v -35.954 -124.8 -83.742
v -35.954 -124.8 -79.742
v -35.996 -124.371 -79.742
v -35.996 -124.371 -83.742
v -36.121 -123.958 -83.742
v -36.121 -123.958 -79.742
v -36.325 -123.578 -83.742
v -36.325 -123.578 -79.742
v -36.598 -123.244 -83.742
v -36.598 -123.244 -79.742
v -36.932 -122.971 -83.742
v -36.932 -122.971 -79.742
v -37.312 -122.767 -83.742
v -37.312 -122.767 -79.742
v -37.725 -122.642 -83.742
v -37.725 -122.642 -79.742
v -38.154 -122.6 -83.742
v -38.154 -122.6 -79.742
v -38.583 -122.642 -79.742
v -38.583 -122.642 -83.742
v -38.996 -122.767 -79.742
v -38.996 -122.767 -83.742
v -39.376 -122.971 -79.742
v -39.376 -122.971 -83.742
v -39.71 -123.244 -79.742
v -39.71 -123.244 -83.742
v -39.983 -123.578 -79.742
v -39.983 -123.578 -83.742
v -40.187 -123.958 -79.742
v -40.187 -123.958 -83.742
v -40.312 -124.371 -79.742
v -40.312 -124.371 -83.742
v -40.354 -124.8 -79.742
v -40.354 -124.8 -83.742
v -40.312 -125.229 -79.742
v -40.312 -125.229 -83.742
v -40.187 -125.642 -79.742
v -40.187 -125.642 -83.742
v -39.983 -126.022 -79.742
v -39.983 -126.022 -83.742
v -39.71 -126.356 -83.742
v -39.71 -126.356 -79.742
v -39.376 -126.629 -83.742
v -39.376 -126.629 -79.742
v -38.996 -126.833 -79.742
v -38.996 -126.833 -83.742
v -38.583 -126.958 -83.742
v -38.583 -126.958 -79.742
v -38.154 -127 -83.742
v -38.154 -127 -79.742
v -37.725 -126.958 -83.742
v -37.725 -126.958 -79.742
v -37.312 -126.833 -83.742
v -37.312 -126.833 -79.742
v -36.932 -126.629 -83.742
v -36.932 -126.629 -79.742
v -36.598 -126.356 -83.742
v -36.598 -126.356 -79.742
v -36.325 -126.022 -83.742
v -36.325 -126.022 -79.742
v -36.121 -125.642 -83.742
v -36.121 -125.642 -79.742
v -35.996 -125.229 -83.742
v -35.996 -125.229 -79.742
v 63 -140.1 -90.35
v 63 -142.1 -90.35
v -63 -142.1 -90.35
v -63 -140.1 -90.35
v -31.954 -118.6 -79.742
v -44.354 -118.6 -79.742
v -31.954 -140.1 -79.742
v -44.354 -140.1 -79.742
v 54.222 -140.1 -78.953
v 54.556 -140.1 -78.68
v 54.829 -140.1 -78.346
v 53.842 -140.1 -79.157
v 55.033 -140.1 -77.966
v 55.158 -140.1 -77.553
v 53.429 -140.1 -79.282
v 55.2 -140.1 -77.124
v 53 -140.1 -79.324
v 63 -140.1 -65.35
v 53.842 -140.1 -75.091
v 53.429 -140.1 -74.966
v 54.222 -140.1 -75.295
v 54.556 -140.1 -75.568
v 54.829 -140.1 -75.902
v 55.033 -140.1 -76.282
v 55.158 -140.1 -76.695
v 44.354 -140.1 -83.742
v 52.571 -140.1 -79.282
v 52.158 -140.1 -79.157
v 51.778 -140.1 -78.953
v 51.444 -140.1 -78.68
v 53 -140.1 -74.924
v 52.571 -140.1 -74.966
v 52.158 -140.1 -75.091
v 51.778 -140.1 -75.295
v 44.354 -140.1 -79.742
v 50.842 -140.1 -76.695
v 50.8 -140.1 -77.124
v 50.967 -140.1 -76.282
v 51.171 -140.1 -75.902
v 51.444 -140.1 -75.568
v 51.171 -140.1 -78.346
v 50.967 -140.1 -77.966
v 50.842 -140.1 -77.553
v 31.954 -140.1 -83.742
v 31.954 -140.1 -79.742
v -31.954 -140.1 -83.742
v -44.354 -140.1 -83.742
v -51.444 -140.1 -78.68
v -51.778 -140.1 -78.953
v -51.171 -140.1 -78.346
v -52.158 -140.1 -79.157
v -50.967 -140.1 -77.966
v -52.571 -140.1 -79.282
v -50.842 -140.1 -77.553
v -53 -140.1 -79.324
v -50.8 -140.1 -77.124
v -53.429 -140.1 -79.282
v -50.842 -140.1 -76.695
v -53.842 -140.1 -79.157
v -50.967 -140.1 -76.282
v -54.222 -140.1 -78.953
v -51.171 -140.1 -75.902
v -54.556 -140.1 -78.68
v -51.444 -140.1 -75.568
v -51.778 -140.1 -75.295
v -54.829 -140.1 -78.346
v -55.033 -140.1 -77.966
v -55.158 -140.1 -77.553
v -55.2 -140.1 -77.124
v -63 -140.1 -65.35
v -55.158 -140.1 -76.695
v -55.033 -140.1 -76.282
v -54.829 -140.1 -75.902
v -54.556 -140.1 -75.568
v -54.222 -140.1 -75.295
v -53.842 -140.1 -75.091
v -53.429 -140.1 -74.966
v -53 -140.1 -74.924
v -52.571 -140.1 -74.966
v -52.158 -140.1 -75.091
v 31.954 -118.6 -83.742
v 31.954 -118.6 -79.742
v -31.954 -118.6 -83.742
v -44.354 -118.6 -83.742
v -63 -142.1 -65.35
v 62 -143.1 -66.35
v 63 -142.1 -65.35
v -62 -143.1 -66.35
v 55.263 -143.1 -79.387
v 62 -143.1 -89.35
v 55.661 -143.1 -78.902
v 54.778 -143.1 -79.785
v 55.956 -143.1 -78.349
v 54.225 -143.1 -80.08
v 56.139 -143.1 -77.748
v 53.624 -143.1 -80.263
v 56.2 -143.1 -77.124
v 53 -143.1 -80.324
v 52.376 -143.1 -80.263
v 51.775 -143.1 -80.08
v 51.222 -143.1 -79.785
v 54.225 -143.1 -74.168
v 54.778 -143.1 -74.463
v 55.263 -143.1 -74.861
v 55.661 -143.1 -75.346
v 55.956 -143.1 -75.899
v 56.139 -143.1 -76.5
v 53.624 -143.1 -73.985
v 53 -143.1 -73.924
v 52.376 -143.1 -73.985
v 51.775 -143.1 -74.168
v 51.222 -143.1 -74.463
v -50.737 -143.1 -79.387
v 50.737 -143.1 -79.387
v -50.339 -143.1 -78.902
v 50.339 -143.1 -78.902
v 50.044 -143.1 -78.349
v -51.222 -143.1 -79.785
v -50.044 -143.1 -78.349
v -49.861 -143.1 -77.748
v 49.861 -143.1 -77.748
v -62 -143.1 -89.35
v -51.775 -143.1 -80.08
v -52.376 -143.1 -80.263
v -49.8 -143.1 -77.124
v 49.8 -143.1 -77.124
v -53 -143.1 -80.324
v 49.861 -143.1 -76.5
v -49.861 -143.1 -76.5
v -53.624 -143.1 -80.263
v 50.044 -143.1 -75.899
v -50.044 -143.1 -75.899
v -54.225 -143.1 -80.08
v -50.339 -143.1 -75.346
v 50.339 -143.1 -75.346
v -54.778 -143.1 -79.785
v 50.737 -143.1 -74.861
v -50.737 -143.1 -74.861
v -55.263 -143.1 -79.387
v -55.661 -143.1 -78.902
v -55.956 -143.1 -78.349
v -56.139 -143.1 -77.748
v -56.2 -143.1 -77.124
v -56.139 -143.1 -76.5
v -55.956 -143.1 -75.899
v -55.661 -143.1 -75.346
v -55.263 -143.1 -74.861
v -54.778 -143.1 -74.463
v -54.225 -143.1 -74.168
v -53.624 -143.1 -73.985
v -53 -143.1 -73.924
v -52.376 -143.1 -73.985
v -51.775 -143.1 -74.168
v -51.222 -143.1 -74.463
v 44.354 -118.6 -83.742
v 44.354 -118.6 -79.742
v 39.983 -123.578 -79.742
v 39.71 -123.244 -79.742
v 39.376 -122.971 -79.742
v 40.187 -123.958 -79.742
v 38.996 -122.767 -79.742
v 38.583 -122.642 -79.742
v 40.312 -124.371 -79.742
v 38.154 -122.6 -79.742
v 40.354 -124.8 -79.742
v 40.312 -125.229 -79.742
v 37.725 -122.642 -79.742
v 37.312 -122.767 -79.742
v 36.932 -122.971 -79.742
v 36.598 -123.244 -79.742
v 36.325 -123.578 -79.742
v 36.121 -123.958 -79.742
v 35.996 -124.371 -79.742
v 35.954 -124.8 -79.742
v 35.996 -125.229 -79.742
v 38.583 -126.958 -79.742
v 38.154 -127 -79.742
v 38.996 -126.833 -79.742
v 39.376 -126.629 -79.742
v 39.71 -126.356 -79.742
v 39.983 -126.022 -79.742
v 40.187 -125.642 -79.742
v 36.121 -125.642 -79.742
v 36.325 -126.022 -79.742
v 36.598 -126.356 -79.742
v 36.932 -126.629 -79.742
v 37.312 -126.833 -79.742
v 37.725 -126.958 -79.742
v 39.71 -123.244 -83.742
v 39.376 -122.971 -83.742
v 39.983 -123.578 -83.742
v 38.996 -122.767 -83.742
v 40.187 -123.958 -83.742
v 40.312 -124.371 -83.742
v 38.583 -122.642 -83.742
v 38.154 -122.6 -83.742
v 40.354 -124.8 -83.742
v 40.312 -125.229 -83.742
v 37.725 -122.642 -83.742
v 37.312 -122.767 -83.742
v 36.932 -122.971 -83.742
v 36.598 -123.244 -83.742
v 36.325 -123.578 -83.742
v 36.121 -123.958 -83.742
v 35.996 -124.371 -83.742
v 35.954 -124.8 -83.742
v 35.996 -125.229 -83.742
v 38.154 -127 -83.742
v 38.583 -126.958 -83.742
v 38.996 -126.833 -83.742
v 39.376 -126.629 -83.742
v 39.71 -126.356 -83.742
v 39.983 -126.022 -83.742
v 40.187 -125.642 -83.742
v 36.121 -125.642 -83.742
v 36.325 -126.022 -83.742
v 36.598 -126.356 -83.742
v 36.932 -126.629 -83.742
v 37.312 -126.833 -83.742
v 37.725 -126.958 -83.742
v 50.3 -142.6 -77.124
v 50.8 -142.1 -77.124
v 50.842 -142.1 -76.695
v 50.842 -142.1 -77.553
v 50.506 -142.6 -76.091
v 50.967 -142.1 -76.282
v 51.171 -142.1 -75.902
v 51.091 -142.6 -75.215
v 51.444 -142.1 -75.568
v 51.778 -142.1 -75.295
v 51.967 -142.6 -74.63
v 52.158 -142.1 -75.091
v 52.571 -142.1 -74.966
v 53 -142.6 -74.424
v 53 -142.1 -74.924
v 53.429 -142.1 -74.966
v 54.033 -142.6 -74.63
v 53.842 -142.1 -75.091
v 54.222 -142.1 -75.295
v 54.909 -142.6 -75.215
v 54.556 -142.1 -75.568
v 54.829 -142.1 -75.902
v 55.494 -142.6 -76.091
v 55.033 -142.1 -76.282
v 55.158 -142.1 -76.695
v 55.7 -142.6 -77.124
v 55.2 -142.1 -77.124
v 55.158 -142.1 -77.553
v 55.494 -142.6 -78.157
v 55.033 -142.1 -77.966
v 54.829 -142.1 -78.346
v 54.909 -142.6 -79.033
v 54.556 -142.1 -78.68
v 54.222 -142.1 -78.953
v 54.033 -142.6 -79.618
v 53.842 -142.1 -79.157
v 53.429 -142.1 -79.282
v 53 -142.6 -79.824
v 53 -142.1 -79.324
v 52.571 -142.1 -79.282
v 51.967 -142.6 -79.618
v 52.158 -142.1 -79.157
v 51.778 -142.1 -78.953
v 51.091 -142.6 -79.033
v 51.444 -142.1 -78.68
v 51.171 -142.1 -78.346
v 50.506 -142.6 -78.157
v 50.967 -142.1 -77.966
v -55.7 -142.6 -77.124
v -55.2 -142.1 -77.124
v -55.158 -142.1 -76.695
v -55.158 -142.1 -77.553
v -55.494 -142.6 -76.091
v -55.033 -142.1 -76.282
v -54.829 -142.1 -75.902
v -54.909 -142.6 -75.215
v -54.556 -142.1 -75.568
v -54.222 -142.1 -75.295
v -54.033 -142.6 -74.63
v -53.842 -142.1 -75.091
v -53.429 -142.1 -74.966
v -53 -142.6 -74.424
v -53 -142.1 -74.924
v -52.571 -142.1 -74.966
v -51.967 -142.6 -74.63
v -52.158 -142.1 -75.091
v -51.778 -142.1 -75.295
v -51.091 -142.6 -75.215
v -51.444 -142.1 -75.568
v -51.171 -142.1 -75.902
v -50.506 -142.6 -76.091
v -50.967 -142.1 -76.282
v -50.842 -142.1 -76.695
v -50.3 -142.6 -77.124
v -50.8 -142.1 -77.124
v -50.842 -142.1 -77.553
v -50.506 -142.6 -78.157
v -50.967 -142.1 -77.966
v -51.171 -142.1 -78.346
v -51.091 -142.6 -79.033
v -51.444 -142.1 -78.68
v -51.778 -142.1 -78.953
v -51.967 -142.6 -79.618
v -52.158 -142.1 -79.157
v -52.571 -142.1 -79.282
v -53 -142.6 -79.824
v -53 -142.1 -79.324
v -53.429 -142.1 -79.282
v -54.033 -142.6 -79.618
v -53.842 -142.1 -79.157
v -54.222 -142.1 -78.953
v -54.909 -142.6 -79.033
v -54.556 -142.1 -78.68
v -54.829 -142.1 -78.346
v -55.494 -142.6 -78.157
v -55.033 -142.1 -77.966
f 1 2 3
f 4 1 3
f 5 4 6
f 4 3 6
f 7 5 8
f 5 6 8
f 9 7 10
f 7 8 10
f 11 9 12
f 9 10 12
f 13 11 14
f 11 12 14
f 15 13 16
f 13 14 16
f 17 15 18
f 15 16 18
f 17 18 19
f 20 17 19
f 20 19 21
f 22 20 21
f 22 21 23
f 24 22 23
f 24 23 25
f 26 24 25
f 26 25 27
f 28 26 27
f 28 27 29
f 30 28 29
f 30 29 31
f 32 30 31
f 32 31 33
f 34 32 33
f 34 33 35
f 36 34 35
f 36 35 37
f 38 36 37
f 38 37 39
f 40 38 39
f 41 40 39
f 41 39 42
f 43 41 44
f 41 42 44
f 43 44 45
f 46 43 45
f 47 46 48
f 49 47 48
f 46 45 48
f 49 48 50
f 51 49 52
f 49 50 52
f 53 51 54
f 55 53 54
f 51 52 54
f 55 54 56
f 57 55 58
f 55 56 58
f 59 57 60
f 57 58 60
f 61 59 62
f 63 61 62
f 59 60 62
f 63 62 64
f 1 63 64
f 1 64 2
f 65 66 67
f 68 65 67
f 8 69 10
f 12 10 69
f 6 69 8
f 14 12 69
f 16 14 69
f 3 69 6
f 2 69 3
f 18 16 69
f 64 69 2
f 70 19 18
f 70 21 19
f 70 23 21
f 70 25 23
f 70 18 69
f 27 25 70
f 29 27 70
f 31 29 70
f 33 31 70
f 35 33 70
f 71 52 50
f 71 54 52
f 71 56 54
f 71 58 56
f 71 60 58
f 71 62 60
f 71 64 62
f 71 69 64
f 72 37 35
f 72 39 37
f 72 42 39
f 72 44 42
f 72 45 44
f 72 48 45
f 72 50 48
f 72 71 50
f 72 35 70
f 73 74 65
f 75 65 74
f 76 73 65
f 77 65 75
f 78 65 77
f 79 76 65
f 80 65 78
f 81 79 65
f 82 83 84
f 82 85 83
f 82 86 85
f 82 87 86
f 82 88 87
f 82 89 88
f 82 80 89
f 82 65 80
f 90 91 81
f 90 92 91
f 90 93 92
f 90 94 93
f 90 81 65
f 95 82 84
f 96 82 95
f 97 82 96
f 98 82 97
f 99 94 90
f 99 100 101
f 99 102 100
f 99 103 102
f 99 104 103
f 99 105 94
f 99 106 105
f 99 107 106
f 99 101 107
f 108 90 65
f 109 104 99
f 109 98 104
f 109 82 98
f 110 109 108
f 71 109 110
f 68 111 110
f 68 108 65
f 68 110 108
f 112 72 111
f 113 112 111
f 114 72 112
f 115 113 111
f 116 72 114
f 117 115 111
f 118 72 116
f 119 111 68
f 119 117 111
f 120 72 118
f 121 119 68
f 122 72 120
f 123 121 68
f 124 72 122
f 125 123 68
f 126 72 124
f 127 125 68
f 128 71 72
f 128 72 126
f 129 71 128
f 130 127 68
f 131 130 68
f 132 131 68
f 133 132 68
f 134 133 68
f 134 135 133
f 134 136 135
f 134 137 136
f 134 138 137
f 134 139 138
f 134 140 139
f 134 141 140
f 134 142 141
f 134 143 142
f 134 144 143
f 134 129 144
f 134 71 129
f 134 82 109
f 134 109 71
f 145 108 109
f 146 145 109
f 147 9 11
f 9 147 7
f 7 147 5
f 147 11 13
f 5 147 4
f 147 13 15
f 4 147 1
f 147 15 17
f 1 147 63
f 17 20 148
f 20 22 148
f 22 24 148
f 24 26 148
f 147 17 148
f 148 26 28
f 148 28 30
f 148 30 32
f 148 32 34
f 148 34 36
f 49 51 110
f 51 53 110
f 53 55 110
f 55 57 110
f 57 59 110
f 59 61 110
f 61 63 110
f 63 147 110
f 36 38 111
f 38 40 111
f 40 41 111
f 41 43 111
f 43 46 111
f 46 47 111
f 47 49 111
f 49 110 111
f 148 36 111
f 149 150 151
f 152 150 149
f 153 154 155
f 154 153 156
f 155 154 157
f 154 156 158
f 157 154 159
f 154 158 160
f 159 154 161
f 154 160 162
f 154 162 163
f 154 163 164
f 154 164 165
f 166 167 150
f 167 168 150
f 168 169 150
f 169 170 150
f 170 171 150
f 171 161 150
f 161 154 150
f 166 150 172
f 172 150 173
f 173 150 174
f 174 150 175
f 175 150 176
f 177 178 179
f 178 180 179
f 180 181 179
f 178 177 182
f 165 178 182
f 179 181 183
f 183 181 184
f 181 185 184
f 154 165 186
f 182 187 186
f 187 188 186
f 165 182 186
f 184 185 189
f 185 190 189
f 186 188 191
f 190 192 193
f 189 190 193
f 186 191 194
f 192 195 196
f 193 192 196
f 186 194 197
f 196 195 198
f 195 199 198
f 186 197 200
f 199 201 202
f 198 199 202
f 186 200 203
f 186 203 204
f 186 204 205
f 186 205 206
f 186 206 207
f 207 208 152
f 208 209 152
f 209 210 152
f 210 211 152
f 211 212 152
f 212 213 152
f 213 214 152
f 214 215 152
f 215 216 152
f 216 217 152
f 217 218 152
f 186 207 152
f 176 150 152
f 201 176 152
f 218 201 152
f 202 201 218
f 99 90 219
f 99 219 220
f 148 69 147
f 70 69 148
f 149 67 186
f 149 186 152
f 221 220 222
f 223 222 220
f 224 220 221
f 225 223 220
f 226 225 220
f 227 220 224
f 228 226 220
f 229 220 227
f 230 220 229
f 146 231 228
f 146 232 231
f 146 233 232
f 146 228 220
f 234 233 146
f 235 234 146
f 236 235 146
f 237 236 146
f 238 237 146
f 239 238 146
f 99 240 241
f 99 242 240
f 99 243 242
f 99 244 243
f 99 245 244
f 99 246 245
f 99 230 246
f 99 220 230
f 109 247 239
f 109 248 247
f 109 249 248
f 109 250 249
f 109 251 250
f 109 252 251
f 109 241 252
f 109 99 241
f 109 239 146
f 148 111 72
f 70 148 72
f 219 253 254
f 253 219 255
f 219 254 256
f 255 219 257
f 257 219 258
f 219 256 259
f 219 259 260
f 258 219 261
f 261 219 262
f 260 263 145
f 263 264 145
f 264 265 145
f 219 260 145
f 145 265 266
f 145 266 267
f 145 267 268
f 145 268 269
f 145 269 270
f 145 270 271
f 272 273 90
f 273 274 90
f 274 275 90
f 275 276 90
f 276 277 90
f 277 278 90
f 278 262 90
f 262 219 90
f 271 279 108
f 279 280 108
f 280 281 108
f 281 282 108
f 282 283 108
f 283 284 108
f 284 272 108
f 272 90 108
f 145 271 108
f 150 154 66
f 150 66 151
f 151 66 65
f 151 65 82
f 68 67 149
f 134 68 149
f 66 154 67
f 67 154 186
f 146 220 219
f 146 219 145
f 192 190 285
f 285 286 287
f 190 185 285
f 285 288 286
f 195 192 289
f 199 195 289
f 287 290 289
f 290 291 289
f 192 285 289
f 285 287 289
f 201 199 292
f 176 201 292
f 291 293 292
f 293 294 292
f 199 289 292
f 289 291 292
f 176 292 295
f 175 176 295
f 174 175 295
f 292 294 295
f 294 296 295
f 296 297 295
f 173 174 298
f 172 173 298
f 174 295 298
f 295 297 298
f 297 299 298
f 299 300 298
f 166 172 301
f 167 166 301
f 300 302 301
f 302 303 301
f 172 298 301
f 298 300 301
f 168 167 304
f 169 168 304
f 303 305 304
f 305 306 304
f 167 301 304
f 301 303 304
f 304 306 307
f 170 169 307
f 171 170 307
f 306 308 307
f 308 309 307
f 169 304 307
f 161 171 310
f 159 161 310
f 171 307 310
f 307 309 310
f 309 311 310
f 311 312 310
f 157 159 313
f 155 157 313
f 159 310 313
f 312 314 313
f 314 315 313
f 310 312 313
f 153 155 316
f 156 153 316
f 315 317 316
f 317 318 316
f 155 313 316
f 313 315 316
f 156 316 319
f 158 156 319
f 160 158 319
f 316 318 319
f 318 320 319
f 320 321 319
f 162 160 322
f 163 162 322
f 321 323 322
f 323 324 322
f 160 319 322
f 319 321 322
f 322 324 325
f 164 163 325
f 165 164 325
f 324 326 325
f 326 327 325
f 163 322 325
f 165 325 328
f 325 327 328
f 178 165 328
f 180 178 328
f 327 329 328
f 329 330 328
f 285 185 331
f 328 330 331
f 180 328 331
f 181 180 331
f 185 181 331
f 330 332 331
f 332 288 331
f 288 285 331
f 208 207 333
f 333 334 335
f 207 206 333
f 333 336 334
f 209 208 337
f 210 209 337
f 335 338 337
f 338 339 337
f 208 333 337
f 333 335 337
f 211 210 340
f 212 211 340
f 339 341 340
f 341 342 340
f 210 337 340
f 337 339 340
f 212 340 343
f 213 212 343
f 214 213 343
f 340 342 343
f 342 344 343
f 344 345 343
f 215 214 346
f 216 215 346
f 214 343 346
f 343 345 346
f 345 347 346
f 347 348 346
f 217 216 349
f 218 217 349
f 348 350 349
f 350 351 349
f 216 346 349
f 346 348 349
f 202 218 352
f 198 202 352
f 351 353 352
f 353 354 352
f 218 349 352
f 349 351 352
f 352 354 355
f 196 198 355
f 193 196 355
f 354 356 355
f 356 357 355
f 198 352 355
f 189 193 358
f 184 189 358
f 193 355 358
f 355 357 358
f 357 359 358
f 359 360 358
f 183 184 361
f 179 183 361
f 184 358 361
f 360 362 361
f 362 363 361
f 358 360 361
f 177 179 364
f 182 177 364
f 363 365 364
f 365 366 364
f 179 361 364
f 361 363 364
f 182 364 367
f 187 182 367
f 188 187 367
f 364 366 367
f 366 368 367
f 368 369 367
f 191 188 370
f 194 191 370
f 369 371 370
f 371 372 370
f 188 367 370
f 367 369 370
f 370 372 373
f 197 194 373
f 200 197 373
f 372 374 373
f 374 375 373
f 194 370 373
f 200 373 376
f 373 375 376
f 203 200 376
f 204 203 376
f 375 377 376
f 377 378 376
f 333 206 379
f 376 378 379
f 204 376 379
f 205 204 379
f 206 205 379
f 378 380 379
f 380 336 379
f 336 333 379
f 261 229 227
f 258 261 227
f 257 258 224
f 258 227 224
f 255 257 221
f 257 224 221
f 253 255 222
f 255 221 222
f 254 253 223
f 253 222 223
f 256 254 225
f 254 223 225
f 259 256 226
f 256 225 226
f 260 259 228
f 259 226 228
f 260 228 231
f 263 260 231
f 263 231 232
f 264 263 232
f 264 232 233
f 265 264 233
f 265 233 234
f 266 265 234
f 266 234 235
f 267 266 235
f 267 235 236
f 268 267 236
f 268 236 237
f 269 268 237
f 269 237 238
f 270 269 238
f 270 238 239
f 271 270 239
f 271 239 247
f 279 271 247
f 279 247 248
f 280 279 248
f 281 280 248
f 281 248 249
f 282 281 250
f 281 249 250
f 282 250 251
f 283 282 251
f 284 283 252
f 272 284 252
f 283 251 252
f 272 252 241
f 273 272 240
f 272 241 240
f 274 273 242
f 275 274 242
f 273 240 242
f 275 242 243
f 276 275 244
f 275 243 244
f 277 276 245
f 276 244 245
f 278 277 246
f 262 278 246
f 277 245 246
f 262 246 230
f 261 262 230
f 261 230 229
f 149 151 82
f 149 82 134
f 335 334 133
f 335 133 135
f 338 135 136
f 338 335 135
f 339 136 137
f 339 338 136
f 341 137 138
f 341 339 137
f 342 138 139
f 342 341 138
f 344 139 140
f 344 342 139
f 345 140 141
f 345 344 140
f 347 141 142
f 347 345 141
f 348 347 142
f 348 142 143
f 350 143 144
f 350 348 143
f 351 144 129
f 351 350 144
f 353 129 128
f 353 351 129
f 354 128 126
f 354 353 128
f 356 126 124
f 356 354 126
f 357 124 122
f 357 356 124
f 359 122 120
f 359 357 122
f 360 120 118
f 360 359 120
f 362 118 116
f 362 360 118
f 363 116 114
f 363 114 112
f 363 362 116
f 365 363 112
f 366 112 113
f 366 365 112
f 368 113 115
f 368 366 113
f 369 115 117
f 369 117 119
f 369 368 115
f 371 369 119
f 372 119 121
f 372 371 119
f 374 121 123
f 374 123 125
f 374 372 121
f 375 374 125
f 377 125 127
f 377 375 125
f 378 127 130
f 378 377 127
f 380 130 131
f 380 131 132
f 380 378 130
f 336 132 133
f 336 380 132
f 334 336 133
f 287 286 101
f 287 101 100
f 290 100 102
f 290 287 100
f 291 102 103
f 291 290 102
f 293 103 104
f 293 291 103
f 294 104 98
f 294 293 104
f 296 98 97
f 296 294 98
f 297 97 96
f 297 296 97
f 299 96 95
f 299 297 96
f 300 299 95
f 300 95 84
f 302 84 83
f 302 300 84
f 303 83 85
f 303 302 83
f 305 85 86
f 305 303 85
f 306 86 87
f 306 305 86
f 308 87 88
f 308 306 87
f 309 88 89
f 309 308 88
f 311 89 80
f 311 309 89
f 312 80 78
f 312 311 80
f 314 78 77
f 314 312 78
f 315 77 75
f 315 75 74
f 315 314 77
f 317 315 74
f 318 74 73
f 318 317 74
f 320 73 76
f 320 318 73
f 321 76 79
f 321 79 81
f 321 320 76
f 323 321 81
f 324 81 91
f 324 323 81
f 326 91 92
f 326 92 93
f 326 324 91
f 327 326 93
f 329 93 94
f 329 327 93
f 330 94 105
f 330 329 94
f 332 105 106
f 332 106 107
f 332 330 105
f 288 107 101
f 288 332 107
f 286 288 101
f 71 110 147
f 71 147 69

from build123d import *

# Parameters (mm, degrees)
SKETCH056_W             = 126
SKETCH056_H             = 25
SKETCH056_R             = 2.2
PAD024_DEPTH            = 3
SKETCH057_W             = 12.4
SKETCH057_H             = 4
PAD025_DEPTH            = 21.5
SKETCH058_R             = 2.2
POCKET031_DEPTH         = 10.609
CHAMFER023_SIZE         = 1
BODY012_ROLL_ANGLE      = 90
BODY012_PLACEMENT_ANGLE = 180


with BuildPart() as part:
    # Sketch056 → Pad024 (new body)
    with BuildSketch(Plane.XY):
        Rectangle(SKETCH056_W, SKETCH056_H)
        with Locations((-53, 0.726)):
            Circle(SKETCH056_R, mode=Mode.SUBTRACT)
        with Locations((53, 0.726)):
            Circle(SKETCH056_R, mode=Mode.SUBTRACT)
    extrude(amount=PAD024_DEPTH)

    # Sketch057 (on Face8 of Pad024) → Pad025 (join)
    with BuildSketch(Plane.XY.offset(3)):
        with Locations((-38.154, -3.892)):
            Rectangle(SKETCH057_W, SKETCH057_H)
        with Locations((38.154, -3.892)):
            Rectangle(SKETCH057_W, SKETCH057_H)
    extrude(amount=PAD025_DEPTH)

    # Sketch058 (on Face12 of Pad025) → Pocket031 (cut, through all)
    with BuildSketch(Plane(origin=(0, -1.892, 0), x_dir=(-1, 0, 0), z_dir=(0, 1, 0))):
        with Locations((-38.154, 18.3)):
            Circle(SKETCH058_R)
        with Locations((38.154, 18.3)):
            Circle(SKETCH058_R)
    extrude(amount=-POCKET031_DEPTH, mode=Mode.SUBTRACT)

    # Chamfer023
    chamfer023_edges = [part.edges().sort_by_distance(p)[0] for p in [
        (0, 12.5, 0),
        (63, 0, 0),
        (0, -12.5, 0),
        (-63, 0, 0),
        (50.8, 0.726, 0),
        (-55.2, 0.726, 0),
    ]]
    chamfer(chamfer023_edges, length=CHAMFER023_SIZE)


with BuildPart() as part_1:
    # Body012 roll: moved
    add(part.part.rotate(Axis((0, 0, 0), (1, 0, 0)), BODY012_ROLL_ANGLE))


with BuildPart() as part_2:
    # Body012 placement: moved
    add(part_1.part.moved(Location((0, -143.1, -77.85))).rotate(Axis((0, -143.1, -77.85), (0, 0, 1)), BODY012_PLACEMENT_ANGLE))


solid = part_2.part
